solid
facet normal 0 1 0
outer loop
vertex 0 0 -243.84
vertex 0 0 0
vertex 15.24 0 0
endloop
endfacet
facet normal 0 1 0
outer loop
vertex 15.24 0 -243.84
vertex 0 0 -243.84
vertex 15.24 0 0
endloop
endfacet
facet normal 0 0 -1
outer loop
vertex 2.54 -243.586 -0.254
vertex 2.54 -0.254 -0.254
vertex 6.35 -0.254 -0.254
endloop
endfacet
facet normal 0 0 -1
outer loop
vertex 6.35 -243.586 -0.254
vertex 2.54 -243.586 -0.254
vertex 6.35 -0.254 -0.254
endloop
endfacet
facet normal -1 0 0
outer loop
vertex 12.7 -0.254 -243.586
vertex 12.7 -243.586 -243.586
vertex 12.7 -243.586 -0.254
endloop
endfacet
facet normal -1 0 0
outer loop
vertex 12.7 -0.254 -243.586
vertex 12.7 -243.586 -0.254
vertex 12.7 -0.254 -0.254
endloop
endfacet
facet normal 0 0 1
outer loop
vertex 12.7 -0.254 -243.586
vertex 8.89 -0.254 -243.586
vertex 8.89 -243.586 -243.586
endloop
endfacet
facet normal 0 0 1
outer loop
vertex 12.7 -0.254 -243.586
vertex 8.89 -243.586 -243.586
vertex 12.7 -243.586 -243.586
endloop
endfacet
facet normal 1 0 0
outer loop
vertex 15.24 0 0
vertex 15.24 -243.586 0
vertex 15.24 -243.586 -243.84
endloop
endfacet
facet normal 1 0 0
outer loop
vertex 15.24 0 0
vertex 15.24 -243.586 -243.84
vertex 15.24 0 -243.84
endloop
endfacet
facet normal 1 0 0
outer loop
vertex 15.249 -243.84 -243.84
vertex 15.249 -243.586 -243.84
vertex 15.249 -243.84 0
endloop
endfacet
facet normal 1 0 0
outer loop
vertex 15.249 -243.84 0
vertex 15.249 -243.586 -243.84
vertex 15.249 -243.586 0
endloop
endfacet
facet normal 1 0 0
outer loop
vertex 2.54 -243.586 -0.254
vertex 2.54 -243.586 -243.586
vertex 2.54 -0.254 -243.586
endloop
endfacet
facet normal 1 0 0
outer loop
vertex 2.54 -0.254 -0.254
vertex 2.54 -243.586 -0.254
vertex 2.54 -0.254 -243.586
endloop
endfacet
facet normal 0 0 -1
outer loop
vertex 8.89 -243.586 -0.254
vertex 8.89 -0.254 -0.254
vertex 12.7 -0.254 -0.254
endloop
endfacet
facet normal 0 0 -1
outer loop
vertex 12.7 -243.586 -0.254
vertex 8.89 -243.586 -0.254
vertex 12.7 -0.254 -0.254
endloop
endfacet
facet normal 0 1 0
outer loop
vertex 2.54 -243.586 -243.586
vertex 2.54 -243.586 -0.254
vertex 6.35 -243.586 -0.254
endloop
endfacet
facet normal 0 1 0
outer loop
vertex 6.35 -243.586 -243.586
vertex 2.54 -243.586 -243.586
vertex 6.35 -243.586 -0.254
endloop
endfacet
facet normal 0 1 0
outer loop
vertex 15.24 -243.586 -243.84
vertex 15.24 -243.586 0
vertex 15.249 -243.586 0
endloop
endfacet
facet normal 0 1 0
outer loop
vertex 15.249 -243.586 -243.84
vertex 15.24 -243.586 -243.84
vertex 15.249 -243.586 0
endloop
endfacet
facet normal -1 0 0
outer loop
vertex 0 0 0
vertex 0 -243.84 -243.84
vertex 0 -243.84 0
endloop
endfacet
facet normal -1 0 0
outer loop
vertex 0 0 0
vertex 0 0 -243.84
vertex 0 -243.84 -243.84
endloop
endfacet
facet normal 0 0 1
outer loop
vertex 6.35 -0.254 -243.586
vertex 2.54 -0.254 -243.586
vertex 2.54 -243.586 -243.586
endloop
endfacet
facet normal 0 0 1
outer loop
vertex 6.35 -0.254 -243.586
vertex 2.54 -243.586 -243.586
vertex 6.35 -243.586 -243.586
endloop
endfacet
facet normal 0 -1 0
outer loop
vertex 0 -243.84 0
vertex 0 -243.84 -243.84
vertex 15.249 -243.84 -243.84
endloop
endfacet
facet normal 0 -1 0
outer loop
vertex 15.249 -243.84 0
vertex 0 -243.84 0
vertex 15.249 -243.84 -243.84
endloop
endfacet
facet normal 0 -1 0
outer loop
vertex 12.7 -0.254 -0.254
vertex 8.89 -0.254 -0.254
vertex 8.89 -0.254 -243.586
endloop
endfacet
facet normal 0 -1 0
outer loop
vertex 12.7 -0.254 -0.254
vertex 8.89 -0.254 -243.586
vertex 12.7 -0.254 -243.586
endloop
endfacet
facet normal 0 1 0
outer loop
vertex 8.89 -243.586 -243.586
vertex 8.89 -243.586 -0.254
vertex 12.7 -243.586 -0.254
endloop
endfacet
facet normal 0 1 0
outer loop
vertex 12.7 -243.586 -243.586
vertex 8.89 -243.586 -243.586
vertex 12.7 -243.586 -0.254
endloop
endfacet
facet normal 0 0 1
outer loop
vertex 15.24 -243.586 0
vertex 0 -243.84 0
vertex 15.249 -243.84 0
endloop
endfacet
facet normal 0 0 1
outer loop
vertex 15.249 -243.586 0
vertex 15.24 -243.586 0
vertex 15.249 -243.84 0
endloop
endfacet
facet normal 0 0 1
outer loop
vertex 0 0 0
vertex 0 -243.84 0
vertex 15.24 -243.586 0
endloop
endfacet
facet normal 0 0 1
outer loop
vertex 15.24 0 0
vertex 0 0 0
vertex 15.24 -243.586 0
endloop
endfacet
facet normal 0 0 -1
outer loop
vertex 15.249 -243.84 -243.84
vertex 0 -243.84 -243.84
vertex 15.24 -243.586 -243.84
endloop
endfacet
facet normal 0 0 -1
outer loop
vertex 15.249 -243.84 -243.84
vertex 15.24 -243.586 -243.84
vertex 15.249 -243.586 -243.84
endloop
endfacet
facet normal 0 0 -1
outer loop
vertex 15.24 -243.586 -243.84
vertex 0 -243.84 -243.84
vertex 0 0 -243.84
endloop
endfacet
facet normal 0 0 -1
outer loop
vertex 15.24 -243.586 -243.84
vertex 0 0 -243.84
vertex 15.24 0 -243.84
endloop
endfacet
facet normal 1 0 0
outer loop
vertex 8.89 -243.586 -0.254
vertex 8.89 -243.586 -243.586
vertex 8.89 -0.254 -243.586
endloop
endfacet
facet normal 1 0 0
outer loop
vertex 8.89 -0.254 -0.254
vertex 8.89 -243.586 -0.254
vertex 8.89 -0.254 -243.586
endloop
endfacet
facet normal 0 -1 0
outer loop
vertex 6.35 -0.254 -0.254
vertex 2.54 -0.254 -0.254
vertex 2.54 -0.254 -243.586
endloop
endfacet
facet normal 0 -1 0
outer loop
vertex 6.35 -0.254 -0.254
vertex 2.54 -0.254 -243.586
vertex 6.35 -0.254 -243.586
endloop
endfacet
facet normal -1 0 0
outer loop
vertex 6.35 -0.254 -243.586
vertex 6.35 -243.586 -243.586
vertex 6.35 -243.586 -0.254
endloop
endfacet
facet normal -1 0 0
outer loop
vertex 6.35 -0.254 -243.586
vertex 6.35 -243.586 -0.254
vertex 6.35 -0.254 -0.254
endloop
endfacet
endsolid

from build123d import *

# Parameters (mm, degrees)
F0_W     = 15.24
F0_H     = 243.84
F1_DEPTH = 0.254
F2_W     = 15.24
F2_H     = 0.254
F3_DEPTH = 243.332
F4_W     = 15.249304
F4_H     = 243.84
F5_DEPTH = 0.254
F6_W     = 2.54
F6_H     = 243.332
F7_DEPTH = 243.332


with BuildPart() as f1:
    # F0 (on Front) → F1 (new body)
    with BuildSketch(Plane.XZ):
        with Locations((7.62, -121.92)):
            Rectangle(F0_W, F0_H)
    extrude(amount=F1_DEPTH)

    # F2 (on face) → F3 (join)
    with BuildSketch(Plane.XZ.offset(0.254)):
        with Locations((7.62, -0.127)):
            Rectangle(F2_W, F2_H)
        with Locations((7.62, -243.713)):
            Rectangle(F2_W, F2_H)
    extrude(amount=F3_DEPTH)

    # F4 (on face) → F5 (join)
    with BuildSketch(Plane.XZ.offset(243.586)):
        with Locations((7.624652, -121.92)):
            Rectangle(F4_W, F4_H)
    extrude(amount=F5_DEPTH)

    # F6 (on face) → F7 (join)
    with BuildSketch(Plane.XY.offset(-243.586)):
        with Locations((13.97, -121.92)):
            Rectangle(F6_W, F6_H)
        with Locations((7.62, -121.92)):
            Rectangle(F6_W, F6_H)
        with Locations((1.27, -121.92)):
            Rectangle(F6_W, F6_H)
    extrude(amount=F7_DEPTH)


solid = f1.part
